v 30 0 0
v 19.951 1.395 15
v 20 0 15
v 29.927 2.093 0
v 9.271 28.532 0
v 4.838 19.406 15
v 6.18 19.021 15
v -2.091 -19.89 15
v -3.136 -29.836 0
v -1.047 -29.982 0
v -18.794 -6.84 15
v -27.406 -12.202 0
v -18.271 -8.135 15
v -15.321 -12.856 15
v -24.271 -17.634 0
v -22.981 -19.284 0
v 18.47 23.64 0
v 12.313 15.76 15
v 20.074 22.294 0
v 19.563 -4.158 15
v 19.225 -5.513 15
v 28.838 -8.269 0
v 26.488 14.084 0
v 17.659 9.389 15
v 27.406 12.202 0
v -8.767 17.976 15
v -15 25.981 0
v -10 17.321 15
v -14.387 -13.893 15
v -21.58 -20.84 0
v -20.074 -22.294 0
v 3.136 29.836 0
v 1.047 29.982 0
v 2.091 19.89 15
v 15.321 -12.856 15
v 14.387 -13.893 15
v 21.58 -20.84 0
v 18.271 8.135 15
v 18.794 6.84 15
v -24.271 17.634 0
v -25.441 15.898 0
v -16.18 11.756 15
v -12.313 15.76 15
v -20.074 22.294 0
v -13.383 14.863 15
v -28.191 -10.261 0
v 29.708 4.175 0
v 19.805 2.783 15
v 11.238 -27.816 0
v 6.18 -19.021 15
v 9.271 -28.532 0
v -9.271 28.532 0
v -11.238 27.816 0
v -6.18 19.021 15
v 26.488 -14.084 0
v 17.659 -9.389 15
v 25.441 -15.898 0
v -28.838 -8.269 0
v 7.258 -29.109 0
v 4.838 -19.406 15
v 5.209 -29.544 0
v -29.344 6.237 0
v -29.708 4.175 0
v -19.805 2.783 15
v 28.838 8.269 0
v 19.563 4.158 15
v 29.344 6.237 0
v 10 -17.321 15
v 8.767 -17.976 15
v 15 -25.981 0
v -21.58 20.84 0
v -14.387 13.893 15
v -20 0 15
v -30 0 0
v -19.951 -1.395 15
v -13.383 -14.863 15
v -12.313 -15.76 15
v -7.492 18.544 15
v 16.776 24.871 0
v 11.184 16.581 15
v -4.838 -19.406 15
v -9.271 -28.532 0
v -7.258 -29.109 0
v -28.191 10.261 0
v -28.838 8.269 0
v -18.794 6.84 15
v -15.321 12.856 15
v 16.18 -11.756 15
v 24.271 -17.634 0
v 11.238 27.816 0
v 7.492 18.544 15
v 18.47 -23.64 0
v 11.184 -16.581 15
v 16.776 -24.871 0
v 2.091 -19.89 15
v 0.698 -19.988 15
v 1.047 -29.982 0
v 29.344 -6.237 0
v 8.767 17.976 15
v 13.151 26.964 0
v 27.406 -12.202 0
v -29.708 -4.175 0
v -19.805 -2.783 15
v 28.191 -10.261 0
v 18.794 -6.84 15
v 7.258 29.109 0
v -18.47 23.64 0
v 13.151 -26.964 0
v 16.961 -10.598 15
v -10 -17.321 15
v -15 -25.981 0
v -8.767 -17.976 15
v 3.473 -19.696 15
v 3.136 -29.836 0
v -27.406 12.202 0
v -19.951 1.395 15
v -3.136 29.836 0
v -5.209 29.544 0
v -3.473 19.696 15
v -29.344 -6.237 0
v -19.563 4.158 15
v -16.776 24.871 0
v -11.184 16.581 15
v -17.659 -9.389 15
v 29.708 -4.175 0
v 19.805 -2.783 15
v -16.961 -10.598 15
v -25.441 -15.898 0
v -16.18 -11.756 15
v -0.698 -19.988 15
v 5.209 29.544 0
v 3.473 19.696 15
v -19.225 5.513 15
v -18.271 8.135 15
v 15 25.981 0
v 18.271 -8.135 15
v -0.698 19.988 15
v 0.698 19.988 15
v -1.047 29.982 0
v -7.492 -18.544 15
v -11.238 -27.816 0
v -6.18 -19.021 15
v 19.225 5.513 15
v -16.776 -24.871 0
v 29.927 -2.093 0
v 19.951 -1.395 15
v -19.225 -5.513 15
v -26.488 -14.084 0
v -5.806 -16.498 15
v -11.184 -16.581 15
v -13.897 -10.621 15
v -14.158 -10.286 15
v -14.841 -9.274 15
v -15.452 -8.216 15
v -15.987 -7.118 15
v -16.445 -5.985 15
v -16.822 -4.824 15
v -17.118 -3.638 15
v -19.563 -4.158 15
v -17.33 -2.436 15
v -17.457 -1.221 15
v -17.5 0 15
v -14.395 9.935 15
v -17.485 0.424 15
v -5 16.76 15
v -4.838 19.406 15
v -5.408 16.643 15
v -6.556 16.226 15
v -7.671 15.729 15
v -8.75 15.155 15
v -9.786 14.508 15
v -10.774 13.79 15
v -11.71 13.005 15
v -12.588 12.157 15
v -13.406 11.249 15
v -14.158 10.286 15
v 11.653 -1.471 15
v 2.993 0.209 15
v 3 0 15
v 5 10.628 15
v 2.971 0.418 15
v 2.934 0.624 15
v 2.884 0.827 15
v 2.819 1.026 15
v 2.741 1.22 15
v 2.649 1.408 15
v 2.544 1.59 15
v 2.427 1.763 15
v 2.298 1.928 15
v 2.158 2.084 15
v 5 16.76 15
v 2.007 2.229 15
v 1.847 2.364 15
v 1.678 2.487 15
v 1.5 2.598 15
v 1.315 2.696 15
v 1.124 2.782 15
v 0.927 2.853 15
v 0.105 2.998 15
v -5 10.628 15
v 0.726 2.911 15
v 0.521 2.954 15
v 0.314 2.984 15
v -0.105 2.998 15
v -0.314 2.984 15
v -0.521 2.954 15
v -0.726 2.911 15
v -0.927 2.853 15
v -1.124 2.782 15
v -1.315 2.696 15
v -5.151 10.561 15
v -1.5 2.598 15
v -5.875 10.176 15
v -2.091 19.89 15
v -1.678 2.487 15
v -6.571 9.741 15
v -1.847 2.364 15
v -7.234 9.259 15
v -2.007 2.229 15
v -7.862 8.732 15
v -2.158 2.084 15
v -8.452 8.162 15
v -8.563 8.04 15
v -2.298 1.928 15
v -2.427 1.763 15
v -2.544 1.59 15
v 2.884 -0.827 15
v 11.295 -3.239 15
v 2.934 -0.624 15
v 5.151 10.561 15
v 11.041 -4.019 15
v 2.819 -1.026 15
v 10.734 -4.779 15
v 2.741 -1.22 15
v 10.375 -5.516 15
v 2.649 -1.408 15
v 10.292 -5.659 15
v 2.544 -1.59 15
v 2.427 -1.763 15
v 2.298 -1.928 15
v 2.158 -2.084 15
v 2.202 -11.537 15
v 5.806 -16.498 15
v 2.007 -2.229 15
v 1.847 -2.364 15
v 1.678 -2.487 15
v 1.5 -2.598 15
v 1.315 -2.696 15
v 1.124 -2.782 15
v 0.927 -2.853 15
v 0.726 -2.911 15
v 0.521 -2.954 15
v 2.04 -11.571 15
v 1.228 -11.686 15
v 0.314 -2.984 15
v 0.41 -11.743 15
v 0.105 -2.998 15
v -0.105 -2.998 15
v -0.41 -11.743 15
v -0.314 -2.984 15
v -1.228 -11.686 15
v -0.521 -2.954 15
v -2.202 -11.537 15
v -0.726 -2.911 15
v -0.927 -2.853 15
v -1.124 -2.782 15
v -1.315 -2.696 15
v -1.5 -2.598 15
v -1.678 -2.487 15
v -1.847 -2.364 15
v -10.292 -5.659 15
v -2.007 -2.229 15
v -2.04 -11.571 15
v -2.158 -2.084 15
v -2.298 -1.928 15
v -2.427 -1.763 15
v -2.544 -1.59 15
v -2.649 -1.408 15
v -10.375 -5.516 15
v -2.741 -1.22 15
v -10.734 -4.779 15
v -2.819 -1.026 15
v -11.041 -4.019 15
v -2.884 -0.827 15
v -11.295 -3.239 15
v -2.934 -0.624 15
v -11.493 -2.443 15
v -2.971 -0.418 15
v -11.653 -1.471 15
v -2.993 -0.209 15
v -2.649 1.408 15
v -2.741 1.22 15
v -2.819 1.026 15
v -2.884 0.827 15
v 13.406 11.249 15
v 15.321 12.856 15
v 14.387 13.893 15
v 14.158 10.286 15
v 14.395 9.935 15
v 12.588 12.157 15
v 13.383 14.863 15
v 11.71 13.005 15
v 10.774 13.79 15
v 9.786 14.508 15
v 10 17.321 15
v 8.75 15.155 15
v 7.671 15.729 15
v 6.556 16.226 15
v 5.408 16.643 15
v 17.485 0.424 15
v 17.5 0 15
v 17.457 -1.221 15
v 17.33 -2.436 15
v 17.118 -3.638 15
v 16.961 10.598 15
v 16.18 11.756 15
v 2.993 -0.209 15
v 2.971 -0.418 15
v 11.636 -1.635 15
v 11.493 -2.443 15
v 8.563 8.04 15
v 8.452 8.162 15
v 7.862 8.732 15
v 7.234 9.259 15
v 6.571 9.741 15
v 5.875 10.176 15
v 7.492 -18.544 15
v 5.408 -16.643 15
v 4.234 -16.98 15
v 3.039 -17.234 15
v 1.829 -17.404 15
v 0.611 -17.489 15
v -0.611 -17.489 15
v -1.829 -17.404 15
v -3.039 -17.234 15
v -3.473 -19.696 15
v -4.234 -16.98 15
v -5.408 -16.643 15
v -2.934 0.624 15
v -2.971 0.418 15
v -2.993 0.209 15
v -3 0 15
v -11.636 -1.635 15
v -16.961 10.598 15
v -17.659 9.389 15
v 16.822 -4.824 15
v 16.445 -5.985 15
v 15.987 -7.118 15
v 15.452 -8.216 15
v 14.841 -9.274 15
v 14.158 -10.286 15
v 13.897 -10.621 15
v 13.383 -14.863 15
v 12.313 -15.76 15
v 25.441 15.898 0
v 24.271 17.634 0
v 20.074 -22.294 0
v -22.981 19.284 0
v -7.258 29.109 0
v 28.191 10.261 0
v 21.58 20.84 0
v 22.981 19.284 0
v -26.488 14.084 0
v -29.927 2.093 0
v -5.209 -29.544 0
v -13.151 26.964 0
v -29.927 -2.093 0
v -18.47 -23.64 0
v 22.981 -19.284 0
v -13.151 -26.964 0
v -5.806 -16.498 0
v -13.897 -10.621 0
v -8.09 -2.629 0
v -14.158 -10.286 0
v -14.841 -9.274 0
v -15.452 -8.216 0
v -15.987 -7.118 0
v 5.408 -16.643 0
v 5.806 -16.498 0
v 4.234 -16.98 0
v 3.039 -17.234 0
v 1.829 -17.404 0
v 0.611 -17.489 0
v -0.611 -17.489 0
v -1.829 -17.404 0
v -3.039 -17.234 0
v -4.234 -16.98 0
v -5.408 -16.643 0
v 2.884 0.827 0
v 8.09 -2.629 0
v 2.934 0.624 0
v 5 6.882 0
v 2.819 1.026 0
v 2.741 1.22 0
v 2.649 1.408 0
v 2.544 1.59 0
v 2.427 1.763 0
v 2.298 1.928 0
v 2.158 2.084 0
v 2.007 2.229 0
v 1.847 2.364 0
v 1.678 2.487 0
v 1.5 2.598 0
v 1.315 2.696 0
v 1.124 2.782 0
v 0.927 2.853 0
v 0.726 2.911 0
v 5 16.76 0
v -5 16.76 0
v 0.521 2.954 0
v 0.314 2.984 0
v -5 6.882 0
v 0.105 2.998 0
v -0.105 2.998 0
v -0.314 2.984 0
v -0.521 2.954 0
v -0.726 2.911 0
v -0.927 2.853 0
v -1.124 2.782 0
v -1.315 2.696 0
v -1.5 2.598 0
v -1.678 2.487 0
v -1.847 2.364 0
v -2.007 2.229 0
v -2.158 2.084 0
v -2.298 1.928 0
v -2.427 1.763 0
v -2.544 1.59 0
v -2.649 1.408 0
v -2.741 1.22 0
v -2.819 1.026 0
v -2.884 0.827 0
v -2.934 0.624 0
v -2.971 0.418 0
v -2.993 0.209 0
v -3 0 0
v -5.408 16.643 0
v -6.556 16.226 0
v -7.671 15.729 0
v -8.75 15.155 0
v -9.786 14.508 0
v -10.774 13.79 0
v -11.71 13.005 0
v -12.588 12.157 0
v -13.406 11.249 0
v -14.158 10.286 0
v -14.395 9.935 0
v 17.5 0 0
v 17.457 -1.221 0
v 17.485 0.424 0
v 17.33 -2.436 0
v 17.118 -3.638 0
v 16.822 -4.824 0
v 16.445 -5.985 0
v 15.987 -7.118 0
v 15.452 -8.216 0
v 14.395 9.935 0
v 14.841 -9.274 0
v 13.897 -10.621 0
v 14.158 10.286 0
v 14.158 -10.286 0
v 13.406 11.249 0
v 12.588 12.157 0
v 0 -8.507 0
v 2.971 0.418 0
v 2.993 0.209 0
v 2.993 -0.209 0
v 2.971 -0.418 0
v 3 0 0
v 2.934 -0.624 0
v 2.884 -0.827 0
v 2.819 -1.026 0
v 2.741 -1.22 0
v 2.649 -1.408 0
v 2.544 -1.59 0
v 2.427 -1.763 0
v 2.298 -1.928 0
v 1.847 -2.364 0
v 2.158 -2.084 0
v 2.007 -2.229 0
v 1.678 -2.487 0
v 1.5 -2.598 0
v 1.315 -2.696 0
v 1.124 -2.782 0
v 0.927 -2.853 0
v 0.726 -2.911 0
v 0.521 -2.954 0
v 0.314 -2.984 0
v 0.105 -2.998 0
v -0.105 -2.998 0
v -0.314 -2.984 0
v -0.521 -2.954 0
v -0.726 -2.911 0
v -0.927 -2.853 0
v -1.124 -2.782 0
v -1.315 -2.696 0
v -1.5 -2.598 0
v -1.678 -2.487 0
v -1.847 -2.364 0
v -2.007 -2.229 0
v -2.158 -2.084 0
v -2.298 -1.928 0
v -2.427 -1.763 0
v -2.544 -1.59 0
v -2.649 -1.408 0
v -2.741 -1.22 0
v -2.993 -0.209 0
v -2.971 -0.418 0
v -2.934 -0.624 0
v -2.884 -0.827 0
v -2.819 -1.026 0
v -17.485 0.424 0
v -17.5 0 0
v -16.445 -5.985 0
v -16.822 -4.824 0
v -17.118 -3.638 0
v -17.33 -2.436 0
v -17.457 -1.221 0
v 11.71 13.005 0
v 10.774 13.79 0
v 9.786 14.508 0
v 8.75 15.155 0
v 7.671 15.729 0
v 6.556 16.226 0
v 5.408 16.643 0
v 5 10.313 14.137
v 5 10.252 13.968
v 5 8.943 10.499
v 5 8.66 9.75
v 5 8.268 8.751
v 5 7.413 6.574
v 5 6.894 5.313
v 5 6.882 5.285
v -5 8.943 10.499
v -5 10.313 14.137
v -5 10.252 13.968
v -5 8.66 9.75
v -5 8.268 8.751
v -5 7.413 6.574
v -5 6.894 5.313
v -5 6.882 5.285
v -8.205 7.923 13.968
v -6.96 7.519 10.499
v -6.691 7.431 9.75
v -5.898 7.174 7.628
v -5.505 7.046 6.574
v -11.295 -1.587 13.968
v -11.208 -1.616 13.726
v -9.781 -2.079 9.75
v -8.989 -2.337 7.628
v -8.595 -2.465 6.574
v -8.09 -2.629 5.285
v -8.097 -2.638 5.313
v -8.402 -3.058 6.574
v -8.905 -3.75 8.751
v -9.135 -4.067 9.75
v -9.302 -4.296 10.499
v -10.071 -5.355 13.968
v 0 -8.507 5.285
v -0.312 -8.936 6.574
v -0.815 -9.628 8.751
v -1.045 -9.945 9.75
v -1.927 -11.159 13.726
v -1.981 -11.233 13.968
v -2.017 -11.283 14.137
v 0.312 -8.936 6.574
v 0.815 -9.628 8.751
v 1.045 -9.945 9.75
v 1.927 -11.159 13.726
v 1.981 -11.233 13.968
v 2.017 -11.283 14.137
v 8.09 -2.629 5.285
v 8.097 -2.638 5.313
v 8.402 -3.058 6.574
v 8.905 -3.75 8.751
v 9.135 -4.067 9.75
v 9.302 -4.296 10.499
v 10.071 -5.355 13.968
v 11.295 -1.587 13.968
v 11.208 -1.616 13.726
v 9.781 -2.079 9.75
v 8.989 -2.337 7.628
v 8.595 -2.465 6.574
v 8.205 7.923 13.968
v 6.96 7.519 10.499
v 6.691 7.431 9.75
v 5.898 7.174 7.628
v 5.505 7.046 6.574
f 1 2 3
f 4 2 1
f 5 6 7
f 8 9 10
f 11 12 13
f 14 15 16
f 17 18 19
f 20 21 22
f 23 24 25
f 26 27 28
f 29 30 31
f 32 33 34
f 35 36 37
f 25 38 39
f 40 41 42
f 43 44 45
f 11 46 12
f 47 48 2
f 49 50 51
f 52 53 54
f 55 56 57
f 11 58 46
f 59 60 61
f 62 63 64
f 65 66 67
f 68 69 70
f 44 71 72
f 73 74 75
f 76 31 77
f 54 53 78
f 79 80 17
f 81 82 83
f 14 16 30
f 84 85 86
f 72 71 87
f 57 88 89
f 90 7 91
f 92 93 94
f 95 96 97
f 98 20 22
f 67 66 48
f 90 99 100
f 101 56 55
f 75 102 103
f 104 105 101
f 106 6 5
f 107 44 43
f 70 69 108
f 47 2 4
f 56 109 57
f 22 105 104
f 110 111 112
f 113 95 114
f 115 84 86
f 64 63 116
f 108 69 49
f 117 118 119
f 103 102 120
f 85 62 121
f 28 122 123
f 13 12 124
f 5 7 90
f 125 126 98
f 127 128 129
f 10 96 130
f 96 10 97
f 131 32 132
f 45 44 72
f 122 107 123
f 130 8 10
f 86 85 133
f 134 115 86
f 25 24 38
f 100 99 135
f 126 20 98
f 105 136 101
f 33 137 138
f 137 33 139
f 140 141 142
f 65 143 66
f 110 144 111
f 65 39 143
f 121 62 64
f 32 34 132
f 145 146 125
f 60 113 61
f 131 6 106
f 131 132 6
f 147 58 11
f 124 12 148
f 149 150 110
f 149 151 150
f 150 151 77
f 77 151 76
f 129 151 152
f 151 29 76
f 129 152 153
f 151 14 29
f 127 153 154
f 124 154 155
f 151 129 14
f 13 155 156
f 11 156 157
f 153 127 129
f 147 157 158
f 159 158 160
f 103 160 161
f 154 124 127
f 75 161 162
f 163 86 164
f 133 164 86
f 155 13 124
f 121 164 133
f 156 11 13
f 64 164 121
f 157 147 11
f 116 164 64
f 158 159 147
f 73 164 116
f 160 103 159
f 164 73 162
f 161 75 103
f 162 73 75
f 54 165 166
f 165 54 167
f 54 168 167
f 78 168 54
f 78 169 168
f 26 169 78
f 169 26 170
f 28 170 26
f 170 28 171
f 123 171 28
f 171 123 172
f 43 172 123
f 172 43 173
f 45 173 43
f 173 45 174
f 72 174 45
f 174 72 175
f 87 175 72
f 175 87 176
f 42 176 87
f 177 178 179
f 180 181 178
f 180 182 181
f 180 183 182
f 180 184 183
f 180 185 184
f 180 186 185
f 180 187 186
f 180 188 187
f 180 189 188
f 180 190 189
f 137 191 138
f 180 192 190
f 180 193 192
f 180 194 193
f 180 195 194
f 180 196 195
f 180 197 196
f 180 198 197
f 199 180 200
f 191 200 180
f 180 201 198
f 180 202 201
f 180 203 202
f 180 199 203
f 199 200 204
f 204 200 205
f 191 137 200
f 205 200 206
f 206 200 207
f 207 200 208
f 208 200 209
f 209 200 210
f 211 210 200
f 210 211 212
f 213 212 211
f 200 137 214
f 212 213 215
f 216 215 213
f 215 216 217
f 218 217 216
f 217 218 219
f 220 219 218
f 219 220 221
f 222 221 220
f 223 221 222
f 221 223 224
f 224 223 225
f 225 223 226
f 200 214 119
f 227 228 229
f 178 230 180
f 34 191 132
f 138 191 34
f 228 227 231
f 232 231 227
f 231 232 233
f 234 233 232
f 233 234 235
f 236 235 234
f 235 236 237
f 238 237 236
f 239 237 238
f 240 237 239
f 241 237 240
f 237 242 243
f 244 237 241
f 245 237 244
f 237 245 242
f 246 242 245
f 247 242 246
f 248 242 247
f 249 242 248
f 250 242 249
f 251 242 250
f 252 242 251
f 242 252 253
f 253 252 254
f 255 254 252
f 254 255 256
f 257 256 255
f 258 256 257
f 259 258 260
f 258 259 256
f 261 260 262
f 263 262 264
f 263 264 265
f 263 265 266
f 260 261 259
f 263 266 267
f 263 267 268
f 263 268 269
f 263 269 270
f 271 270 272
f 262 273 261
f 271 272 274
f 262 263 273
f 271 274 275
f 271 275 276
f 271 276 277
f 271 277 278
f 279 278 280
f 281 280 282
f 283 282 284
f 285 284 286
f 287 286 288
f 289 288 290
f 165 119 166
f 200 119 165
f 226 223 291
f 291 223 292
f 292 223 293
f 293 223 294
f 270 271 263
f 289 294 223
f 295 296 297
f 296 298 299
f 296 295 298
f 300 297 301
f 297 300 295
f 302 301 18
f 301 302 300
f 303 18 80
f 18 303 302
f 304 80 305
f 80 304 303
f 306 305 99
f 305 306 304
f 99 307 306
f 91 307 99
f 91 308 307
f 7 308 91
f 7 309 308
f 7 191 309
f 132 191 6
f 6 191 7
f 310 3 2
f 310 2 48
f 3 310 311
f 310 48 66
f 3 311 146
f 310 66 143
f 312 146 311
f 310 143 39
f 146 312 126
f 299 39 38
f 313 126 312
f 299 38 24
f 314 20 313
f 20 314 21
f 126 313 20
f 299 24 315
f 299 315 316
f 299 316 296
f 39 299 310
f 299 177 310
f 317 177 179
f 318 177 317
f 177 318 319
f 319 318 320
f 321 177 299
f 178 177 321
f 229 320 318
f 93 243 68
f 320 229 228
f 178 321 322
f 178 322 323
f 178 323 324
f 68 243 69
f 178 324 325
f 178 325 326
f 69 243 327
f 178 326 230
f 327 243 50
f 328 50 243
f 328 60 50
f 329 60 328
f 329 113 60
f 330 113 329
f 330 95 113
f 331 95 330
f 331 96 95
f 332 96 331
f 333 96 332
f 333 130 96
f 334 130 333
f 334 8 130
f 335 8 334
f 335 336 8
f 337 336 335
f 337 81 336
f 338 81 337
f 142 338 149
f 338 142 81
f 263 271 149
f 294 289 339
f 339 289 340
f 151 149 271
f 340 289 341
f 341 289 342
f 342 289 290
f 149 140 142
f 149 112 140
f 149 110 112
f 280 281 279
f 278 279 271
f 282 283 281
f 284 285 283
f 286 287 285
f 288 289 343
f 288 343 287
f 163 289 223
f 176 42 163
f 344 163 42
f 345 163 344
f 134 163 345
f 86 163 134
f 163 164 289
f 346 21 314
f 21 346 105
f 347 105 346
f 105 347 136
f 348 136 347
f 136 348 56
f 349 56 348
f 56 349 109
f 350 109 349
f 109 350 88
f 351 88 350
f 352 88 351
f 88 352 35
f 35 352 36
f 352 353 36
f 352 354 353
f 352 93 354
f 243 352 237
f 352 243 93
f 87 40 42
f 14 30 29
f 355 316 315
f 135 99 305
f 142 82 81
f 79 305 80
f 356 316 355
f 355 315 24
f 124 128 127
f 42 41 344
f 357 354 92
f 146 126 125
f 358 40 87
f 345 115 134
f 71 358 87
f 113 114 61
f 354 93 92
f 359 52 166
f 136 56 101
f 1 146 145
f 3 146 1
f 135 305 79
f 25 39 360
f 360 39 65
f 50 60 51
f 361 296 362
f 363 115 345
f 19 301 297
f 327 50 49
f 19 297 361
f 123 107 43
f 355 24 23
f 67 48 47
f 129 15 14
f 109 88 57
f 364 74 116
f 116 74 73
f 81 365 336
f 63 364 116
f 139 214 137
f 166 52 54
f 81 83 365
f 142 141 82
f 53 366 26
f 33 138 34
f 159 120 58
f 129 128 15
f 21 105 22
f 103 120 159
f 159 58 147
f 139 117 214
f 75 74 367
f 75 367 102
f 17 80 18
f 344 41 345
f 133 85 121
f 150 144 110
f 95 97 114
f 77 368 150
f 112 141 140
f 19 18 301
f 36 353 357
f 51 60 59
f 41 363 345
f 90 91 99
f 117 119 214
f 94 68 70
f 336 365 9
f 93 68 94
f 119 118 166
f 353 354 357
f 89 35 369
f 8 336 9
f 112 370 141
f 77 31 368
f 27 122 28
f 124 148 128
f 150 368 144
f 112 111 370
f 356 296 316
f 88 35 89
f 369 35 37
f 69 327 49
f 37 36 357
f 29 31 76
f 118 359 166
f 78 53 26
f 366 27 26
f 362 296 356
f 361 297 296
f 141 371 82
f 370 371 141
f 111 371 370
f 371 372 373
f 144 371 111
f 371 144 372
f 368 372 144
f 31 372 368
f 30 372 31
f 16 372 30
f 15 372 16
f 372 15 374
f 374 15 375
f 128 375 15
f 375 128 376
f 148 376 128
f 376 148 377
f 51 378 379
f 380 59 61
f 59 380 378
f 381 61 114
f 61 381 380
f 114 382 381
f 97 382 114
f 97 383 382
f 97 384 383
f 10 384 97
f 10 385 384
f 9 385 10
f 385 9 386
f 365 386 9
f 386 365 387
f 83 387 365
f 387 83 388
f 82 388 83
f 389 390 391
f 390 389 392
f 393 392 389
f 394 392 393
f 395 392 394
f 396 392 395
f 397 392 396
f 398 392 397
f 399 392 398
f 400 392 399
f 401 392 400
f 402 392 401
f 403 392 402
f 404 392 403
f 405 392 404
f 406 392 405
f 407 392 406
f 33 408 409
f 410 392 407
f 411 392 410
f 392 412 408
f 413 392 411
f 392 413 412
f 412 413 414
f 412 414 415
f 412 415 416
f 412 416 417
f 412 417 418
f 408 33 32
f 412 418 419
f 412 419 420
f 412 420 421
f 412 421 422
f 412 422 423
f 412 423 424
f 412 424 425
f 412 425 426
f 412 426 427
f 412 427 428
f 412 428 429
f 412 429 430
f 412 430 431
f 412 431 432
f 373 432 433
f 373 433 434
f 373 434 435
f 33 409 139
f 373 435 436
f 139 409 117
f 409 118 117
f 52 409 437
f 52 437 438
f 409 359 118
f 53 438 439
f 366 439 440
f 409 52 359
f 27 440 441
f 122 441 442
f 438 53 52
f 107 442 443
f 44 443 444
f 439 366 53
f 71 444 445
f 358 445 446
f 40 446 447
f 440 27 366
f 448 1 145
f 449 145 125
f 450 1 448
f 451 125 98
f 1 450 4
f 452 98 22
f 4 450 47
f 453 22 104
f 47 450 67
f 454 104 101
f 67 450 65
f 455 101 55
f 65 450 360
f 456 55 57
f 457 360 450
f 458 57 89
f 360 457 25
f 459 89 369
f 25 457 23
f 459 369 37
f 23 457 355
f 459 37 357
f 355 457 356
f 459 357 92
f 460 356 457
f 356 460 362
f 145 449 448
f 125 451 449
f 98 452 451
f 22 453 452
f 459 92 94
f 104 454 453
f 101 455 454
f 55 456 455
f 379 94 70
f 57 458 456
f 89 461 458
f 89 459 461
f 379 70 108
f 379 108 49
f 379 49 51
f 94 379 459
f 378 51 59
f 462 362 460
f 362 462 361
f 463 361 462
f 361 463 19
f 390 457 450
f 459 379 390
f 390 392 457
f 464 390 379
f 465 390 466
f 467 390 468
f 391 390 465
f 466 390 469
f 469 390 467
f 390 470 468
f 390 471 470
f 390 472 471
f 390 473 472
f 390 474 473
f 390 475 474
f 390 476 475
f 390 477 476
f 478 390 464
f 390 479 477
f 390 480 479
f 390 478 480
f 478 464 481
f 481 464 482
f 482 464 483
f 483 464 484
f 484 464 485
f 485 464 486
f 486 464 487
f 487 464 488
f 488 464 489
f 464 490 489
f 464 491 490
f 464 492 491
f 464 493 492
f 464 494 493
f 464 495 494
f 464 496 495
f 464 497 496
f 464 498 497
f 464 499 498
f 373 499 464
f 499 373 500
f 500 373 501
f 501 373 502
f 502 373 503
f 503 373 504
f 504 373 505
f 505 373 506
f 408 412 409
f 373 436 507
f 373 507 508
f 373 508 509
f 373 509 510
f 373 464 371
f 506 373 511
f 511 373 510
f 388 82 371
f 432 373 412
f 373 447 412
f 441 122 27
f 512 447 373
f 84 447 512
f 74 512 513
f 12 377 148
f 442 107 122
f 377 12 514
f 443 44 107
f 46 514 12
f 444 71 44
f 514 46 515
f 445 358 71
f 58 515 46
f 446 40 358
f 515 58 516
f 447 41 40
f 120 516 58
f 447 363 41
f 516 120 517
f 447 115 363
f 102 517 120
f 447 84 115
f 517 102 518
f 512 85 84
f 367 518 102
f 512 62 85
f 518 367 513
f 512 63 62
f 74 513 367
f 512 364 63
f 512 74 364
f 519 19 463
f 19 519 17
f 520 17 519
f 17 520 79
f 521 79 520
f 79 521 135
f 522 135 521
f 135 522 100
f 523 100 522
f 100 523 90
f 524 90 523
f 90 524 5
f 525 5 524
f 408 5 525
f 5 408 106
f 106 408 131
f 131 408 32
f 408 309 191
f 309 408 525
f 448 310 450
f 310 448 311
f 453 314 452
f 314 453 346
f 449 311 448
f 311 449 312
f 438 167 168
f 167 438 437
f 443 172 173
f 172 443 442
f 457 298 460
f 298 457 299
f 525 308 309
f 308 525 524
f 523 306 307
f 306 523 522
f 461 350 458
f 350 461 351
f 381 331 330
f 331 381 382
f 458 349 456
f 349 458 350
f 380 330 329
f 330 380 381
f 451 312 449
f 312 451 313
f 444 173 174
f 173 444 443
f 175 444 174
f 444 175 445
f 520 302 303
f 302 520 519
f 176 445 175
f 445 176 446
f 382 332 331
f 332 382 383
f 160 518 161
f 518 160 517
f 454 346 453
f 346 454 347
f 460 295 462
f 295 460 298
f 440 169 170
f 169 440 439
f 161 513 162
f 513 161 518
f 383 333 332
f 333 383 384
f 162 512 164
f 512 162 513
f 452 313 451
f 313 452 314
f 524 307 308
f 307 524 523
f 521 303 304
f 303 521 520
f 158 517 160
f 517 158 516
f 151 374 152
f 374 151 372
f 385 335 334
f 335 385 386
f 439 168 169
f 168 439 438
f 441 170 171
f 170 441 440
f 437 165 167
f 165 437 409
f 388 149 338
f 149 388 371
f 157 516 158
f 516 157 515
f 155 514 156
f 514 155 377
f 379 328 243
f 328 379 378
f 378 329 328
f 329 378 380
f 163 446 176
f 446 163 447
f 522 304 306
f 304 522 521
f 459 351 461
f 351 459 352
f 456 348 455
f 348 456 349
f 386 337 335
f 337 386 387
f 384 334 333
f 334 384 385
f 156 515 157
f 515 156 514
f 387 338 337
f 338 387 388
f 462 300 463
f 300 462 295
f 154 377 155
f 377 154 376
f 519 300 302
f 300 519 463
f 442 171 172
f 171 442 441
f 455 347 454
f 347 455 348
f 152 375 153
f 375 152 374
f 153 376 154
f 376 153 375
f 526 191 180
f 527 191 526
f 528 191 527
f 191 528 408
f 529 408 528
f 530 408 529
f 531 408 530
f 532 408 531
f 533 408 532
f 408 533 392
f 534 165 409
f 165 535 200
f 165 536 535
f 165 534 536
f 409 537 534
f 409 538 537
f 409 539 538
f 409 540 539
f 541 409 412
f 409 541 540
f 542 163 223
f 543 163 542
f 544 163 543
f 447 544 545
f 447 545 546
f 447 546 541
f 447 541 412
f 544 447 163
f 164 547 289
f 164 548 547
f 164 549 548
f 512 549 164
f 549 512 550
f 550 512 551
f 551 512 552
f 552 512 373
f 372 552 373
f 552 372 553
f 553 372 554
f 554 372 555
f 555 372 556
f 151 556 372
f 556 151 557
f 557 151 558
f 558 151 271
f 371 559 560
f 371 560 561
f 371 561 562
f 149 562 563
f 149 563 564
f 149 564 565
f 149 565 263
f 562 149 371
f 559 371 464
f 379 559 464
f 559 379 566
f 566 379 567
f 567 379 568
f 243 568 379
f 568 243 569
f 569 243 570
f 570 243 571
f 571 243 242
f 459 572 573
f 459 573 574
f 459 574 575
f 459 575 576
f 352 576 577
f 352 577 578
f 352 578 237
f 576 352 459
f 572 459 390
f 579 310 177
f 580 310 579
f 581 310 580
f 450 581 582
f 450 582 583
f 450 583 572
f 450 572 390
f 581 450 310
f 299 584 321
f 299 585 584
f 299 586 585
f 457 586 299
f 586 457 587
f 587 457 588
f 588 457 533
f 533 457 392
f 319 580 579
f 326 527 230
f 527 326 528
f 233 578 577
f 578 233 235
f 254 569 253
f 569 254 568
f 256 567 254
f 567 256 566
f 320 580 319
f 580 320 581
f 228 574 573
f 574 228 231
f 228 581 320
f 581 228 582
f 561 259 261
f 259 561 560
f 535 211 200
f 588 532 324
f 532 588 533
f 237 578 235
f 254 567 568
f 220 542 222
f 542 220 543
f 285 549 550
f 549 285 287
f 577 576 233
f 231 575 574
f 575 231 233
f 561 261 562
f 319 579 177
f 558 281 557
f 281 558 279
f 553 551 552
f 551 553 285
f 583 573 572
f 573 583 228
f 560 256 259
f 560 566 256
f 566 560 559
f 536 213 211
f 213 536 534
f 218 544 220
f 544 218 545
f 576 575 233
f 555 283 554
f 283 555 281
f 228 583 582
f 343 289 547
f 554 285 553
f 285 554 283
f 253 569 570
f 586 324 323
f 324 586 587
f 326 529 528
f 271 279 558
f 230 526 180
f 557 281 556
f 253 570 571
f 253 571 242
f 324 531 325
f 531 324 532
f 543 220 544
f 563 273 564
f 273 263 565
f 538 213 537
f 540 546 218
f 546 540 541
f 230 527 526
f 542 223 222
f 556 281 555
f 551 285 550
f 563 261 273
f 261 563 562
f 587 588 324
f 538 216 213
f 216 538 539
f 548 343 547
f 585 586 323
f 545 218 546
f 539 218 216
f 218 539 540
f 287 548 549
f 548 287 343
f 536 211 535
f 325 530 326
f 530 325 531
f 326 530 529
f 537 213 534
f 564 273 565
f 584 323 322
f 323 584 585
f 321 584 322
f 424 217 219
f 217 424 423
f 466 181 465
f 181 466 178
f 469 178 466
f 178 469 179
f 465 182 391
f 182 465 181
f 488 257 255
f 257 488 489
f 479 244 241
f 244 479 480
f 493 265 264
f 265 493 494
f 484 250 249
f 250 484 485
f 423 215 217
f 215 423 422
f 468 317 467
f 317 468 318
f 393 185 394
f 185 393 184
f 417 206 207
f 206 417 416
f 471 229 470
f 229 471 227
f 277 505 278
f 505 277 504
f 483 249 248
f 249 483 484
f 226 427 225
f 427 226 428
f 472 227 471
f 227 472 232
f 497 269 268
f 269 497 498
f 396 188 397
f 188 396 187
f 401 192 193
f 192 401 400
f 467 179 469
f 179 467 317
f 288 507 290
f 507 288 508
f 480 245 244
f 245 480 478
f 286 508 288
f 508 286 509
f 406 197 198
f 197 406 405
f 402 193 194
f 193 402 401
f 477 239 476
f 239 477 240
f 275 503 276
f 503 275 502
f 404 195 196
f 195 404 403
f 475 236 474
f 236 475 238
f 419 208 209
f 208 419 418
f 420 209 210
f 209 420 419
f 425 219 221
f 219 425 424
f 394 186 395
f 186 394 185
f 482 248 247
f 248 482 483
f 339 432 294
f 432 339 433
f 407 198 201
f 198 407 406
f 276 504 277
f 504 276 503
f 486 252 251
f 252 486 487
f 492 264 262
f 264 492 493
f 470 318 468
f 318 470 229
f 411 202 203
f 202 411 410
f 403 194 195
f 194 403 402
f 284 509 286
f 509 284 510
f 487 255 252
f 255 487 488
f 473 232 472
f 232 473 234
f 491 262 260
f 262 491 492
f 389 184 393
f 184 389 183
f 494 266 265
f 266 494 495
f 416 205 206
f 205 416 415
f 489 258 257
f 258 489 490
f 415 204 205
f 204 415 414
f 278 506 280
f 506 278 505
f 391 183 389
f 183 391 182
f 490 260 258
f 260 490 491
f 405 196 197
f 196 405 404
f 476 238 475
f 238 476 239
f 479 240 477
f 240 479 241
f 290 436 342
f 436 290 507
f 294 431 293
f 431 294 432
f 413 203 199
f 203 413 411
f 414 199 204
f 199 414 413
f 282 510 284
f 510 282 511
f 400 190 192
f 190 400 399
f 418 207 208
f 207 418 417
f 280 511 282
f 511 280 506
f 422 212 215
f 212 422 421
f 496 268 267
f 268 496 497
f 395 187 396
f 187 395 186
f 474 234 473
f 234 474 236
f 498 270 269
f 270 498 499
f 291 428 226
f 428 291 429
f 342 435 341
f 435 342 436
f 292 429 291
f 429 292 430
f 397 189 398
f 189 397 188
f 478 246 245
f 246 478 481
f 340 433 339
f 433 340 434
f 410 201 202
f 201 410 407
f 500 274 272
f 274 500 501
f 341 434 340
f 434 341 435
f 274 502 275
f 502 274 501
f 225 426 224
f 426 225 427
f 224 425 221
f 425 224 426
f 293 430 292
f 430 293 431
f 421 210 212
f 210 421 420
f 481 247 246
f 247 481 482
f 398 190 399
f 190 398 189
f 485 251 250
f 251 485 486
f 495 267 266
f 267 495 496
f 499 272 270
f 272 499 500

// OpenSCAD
HOLE = 6;
MARGIN = 10;
D = 50;
H = 15;
WALL = 5;
N = 5;

$fn = 90;

union() {
    difference() {
      cylinder(h=H, d1=D+MARGIN, d2=0.8*D);
      cylinder(h=H, d=0.8*D-WALL);
    }

    difference() {
      union() {
          cylinder(h=H, d2=HOLE+3.5*WALL, d1=HOLE+1.5*WALL);
          
          for(i=[0:N-1]) {
              rotate(a=360/N*i, v=[0,0,1]) 
              translate([-2*WALL/2, 0, 0]) 
              cube([2*WALL, 0.75*D/2, H]);
          }
      }
      cylinder(h=H, d=HOLE, $fn=90);
    }
}
